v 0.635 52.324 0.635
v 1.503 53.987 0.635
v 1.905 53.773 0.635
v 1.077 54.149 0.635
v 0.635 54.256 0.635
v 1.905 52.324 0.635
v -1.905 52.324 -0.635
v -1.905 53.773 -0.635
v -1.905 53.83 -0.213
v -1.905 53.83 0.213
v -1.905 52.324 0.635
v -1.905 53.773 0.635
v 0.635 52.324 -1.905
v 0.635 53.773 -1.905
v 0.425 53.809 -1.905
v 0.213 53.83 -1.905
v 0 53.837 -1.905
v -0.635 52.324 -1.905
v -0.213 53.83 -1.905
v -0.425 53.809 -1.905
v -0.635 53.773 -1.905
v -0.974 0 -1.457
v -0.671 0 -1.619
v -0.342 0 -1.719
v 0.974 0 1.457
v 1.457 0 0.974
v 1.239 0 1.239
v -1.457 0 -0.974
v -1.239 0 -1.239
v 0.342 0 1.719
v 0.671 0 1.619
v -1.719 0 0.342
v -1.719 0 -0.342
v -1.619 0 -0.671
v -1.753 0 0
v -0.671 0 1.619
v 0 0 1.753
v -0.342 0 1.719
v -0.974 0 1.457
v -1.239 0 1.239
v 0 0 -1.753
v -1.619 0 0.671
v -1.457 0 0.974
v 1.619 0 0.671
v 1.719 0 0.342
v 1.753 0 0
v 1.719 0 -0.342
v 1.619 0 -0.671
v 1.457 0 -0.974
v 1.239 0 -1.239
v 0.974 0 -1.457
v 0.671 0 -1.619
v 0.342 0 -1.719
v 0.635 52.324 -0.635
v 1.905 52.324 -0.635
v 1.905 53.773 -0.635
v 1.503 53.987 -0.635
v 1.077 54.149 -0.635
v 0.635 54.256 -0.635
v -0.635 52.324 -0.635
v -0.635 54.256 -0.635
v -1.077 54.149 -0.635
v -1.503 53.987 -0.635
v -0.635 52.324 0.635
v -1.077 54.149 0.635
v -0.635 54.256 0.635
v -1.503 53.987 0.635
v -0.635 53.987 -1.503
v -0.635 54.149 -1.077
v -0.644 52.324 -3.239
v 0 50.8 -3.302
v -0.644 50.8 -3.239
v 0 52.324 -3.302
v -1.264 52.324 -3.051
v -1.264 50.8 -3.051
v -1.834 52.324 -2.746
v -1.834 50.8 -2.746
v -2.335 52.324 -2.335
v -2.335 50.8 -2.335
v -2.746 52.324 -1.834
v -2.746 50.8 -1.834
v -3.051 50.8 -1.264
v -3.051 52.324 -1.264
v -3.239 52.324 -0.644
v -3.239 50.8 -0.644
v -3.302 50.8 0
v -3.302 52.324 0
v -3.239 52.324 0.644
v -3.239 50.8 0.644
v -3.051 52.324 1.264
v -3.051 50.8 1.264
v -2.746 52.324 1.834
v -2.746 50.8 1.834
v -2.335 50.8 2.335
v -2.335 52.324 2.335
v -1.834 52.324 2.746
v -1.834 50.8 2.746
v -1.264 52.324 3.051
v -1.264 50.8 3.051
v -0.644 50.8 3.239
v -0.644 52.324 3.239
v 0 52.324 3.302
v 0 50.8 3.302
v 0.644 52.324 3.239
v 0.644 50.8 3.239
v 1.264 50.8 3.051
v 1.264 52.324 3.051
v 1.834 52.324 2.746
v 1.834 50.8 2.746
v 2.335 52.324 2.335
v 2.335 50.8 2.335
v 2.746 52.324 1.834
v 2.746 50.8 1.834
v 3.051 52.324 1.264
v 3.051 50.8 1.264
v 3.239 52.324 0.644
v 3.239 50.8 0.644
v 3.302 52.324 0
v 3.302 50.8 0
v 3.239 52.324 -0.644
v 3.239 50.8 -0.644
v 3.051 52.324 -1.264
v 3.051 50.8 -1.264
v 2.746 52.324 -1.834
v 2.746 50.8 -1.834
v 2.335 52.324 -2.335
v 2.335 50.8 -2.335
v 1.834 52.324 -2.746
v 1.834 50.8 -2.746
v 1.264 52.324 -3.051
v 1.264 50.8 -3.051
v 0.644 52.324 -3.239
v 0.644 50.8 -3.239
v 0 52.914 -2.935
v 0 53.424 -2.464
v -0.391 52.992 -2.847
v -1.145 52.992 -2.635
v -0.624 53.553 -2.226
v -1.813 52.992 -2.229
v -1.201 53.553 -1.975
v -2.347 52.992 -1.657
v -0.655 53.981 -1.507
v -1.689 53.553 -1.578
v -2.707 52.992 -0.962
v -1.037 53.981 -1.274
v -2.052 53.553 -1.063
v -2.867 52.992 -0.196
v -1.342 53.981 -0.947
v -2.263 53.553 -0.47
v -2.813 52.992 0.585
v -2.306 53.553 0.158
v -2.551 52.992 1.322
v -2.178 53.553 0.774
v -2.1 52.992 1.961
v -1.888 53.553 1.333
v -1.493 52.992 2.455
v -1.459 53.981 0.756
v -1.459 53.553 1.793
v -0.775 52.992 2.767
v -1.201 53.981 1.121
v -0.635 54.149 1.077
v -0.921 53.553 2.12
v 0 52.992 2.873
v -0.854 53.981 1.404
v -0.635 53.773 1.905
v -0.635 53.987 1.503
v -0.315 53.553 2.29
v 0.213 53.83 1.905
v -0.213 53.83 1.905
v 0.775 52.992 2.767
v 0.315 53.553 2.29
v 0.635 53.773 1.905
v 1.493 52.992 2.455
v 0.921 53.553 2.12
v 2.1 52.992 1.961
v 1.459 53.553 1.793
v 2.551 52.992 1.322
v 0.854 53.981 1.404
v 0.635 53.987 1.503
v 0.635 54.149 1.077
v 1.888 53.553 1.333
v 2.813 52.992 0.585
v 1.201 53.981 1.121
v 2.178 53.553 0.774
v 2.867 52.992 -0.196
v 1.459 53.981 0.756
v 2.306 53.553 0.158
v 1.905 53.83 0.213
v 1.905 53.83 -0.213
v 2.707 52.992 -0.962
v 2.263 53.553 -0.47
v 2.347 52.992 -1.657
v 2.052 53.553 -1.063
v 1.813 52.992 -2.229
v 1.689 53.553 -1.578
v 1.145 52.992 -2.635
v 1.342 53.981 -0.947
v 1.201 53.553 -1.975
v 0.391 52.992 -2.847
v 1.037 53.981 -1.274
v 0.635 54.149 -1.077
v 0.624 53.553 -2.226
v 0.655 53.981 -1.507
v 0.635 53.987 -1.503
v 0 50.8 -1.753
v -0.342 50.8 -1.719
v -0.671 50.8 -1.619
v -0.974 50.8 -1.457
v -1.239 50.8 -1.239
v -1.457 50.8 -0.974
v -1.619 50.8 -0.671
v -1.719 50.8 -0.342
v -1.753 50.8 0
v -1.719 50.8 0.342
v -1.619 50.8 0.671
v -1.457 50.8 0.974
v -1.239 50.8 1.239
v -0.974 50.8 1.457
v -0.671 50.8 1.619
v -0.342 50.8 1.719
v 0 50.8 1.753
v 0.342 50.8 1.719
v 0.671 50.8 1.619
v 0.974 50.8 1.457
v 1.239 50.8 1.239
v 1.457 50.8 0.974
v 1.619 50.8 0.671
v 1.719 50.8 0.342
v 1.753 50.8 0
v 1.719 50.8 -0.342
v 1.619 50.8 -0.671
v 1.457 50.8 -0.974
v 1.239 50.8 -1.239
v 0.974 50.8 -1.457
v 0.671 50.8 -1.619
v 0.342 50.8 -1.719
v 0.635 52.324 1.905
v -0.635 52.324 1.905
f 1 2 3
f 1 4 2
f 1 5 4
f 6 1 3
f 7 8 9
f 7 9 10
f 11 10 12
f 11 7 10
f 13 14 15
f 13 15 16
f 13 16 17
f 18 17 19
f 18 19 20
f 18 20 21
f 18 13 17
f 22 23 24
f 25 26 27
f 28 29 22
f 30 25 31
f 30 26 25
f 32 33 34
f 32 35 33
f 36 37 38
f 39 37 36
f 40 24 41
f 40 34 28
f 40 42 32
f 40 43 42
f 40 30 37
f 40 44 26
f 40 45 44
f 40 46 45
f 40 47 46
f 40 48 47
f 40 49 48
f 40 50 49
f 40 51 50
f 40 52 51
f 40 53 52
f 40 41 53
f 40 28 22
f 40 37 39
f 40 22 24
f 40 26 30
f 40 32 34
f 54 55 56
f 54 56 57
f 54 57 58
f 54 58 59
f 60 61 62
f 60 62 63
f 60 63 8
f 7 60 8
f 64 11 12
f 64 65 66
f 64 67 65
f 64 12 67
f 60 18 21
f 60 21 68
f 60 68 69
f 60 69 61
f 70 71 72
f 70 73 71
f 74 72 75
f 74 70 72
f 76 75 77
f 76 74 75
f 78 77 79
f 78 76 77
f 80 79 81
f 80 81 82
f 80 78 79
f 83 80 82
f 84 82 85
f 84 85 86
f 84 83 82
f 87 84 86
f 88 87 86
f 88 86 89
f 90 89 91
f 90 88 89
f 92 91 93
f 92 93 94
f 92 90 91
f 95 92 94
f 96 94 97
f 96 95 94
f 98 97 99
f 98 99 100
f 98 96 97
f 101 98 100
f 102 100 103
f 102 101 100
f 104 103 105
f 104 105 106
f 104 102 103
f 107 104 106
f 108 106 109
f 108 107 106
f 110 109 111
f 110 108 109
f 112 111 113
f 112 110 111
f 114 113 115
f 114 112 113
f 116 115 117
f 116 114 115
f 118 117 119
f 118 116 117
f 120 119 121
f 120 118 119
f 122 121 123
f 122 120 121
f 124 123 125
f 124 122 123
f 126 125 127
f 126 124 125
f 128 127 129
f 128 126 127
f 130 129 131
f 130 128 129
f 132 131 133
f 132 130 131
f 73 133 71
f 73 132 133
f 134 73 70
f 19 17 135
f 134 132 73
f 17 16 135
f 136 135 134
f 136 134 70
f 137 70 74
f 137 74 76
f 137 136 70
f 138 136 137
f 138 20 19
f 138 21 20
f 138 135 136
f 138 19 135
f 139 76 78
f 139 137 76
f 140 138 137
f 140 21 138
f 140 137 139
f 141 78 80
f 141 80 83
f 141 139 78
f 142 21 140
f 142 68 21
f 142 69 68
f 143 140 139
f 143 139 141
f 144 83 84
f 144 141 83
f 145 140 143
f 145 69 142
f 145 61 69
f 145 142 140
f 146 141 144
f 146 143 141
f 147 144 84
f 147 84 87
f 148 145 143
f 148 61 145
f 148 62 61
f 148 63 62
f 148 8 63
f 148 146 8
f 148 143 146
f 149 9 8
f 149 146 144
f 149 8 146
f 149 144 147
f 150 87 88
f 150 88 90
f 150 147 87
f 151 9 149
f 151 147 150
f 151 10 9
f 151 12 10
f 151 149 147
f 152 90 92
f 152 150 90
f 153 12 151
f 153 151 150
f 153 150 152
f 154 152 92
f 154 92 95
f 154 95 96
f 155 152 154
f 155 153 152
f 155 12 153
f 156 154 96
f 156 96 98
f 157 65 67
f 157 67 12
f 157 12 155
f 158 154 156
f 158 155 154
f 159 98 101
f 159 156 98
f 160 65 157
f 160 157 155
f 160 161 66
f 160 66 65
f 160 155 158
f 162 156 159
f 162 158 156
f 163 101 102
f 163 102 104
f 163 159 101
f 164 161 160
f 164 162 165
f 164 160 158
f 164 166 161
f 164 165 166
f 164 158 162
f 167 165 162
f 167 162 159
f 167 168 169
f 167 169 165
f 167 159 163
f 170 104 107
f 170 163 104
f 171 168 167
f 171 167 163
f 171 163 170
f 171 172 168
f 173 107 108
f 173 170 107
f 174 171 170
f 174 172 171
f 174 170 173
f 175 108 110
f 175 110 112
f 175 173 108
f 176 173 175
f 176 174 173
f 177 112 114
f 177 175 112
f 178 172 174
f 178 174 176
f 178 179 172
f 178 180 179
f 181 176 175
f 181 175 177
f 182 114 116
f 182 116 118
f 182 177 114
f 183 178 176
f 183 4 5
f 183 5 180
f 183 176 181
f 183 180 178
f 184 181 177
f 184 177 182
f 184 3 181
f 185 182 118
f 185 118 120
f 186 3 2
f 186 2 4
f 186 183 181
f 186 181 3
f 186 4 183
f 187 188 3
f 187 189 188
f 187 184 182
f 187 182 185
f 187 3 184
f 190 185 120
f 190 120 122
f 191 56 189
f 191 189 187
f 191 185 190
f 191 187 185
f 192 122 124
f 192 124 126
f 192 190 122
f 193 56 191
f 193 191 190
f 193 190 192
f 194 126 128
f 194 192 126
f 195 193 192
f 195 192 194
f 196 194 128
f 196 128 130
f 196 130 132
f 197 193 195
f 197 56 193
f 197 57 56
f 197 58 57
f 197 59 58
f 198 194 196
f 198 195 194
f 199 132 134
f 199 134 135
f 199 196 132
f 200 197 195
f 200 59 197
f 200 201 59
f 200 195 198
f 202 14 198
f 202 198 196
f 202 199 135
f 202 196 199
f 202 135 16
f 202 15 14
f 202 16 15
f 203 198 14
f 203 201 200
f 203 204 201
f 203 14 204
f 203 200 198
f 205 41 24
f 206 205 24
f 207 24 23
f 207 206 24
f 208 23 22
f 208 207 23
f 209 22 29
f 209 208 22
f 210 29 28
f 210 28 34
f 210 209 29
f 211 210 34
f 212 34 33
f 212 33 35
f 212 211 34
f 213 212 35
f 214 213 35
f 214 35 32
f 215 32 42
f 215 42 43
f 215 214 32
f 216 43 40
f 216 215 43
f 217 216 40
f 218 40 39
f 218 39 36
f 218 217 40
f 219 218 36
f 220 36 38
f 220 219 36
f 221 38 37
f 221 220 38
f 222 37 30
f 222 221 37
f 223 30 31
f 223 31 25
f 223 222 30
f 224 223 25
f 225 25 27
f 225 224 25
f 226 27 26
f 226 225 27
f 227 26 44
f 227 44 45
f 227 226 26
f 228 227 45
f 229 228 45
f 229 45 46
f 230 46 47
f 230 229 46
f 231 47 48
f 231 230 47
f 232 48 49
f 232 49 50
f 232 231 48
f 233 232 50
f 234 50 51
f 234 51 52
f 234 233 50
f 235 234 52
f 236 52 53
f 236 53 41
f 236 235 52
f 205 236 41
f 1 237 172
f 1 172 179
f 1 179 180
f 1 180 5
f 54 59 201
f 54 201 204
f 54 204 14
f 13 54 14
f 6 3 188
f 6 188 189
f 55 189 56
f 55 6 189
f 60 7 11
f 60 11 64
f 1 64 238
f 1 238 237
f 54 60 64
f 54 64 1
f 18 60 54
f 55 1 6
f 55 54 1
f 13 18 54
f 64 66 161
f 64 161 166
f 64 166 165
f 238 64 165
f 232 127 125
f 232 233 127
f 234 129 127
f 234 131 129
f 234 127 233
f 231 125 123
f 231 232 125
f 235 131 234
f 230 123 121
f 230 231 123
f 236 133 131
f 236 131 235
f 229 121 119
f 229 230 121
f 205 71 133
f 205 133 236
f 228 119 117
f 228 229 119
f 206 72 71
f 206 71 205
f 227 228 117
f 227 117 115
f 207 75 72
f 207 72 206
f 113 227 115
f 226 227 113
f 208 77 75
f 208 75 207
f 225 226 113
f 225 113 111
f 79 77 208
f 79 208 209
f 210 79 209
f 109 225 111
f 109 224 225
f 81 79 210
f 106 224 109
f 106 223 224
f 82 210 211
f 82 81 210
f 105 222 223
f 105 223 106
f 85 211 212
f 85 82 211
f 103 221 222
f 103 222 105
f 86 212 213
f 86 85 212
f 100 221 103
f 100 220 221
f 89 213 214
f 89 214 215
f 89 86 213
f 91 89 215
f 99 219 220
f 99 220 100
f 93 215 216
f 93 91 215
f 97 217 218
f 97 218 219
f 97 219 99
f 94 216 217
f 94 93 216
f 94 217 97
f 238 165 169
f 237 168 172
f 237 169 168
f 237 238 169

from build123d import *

# Parameters (mm, degrees)
CUT_EXTRUDE1_REACH      = 54.532
CUT_EXTRUDE1_END_RADIUS = 3.68985638


with BuildPart() as part:
    # Sketch1 → Revolve1 (revolve)
    with BuildSketch(Plane.XY, mode=Mode.PRIVATE) as revolve1_sk:
        Polygon((0, 50.677234653), (0, 0), (1.7526, 0), (1.7526, 50.8), (0, 50.8), align=None)
        with BuildLine():
            Line((0, 54.367091034), (0, 50.8))
            Line((0, 50.8), (1.7526, 50.8))
            Line((1.7526, 50.8), (3.302, 50.8))
            Line((3.302, 50.8), (3.302, 52.324))
            ThreePointArc((3.302, 52.324), (1.941483001, 53.815017926), (0, 54.367091034))
        make_face()
    revolve(revolve1_sk.sketch.rotate(Axis((0, -8.932338451, 0), (0, 1, 0)), 90), axis=Axis((0, -8.932338451, 0), (0, 1, 0)))

    # Cut-Extrude1: up to this sphere (the profile starts inside it)
    cut_extrude1_end = Location((0, 50.677234653, 0)) * Sphere(CUT_EXTRUDE1_END_RADIUS, mode=Mode.PRIVATE)
    # Sketch2 → Cut-Extrude1 (cut, up to the surface)
    with BuildSketch(Plane(origin=(0, 52.324, 0), x_dir=(-1, 0, 0), z_dir=(0, -1, 0)), mode=Mode.PRIVATE) as cut_extrude1_sk1:
        Polygon((0.635, 0.635), (1.905, 0.635), (1.905, -0.635), (0.635, -0.635), (0.635, -1.905), (-0.635, -1.905), (-0.635, -0.635), (-1.905, -0.635), (-1.905, 0.635), (-0.635, 0.635), (-0.635, 1.905), (0.635, 1.905), align=None)
    cut_extrude1_tool1 = extrude(cut_extrude1_sk1.sketch, amount=-CUT_EXTRUDE1_REACH, mode=Mode.PRIVATE) & cut_extrude1_end
    add(cut_extrude1_tool1.solids().sort_by_distance((0, 52.324, 0))[0], mode=Mode.SUBTRACT)


solid = part.part
